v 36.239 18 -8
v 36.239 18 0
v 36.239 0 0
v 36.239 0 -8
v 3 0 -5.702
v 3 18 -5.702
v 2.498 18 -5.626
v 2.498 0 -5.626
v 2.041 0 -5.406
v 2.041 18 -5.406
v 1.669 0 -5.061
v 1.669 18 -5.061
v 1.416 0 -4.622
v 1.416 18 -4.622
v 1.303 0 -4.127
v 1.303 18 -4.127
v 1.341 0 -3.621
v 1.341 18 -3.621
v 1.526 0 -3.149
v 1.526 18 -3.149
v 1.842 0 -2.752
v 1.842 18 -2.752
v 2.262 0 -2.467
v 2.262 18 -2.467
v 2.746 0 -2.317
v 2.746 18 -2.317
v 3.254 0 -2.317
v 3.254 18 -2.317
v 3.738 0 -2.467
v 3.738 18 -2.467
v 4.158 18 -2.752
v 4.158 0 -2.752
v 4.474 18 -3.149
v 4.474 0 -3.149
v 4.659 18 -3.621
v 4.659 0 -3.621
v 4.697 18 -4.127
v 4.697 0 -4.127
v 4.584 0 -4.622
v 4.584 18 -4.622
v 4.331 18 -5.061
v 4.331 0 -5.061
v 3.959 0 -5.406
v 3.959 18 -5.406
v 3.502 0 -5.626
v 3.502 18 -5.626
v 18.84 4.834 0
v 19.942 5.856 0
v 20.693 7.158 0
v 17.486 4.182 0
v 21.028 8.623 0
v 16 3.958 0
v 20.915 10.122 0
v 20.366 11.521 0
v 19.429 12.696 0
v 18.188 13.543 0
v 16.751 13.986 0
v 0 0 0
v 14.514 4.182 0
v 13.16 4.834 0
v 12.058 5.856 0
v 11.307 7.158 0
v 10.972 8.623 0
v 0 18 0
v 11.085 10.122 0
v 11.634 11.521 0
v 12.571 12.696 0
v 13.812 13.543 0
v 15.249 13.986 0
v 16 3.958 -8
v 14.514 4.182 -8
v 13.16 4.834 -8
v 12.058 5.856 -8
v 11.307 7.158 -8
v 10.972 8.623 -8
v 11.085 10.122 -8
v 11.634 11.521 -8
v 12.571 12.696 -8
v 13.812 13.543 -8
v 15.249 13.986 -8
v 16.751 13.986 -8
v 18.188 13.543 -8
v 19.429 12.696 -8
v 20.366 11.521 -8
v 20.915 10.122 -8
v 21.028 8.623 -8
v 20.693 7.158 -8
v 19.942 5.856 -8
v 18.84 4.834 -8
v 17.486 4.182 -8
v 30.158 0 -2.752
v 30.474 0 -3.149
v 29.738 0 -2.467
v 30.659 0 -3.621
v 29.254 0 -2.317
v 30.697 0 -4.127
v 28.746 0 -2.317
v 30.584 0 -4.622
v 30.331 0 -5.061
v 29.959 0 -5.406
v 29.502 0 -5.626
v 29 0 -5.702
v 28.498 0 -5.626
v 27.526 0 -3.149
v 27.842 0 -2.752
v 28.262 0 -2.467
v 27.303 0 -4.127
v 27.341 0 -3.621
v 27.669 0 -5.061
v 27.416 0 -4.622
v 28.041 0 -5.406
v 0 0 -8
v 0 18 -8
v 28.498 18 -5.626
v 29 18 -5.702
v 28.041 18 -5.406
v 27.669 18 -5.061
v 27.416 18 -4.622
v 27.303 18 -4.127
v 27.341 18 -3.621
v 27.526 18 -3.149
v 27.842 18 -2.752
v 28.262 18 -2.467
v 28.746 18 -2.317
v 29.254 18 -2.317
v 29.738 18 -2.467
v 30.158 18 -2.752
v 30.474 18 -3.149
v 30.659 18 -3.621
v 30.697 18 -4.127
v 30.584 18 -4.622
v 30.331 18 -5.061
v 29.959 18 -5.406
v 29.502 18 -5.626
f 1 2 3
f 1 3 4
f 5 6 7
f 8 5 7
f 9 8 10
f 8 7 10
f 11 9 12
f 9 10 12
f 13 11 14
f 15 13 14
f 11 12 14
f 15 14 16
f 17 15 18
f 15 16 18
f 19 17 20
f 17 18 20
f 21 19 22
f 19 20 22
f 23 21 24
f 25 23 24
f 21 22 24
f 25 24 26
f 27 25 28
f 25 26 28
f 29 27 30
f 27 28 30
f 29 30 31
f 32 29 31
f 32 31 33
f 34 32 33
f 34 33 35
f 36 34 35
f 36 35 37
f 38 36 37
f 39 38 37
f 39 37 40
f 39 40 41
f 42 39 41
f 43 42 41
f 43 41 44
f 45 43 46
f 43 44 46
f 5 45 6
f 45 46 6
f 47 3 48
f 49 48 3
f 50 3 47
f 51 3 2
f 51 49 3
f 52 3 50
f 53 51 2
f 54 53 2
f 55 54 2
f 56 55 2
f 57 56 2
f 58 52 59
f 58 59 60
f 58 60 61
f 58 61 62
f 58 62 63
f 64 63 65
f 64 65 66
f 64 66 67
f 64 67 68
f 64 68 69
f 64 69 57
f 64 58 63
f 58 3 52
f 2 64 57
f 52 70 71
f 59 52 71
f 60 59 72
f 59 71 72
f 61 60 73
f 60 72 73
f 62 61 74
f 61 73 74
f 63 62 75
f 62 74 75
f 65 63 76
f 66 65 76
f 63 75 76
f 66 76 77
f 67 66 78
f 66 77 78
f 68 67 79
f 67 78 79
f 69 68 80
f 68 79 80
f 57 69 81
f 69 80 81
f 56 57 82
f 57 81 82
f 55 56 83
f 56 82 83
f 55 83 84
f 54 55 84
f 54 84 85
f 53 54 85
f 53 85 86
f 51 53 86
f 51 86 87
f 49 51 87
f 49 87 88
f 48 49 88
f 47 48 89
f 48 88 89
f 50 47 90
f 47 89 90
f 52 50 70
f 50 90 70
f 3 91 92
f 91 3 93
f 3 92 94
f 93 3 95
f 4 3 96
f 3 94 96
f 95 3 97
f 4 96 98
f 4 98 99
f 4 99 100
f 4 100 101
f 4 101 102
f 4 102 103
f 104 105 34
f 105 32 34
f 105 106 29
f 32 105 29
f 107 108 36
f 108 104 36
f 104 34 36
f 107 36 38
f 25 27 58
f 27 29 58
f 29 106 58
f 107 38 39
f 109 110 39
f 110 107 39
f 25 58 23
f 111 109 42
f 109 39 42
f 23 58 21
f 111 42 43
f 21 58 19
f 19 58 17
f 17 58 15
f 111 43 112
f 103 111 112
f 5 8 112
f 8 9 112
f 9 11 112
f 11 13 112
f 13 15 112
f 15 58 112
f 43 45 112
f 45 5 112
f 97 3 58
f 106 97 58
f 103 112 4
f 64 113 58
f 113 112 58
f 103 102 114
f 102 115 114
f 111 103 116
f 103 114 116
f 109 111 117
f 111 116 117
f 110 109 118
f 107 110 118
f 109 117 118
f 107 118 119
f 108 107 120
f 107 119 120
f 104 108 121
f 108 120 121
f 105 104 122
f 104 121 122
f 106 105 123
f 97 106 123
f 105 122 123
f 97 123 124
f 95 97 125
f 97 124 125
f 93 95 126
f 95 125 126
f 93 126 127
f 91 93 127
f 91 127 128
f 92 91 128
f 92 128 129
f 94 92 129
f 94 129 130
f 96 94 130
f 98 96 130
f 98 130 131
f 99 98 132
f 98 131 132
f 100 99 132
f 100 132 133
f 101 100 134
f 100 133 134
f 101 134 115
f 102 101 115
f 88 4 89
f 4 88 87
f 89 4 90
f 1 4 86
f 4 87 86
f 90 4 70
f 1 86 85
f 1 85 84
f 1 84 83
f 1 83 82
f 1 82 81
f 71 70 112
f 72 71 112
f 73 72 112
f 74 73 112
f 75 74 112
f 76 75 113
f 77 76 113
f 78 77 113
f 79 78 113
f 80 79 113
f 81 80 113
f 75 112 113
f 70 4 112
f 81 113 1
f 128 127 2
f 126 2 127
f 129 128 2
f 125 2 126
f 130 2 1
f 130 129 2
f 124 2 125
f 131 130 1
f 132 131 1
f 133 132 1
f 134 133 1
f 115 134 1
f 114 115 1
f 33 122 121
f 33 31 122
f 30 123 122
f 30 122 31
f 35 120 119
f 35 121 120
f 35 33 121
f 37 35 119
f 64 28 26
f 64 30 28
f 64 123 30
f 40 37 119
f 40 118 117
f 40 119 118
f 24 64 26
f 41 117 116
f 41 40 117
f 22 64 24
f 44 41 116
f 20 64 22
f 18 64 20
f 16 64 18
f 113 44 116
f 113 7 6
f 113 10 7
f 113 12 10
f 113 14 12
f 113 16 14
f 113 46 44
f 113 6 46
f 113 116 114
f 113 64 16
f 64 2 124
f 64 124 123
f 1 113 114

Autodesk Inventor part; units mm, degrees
ref_plane "YZ Plane" through (0, 0, 0) normal (1, 0, 0) x (0, 1, 0)
ref_plane "XZ Plane" through (0, 0, 0) normal (0, 1, 0) x (-1, 0, 0)
ref_plane "XY Plane" through (0, 0, 0) normal (0, 0, 1) x (1, 0, 0)
sketch "Sketch1" plane through (0, 0, 0) normal (0, 1, 0) x (-1, 0, 0)
  line L0 (0, 0) -> (-32, 0)
  line L1 (-32, 0) -> (-32, -8)
  line L2 (-32, -8) -> (0, -8)
  line L3 (0, -8) -> (0, 0)
  line L4 (0, -4) -> (-32, -4) construction
  circle A0 centre (-3, -4) radius 1.5
  circle A1 centre (-29, -4) radius 1.5
  dimension "d1" = 8
  dimension "d2" = 26
  dimension "d20" = 3
  dimension "d21" = 3
  dimension "d22" = 3
extrude "Extrusion1" add sketch "Sketch1" along normal blind 18 contours L3 L2 L1 L0 | A0 | A1
hole "Hole1" at (29, 0, -4) at (3, 0, -4) direction (0, 1, 0) diameter 3.4036 end through all clearance for "Flat Head Machine Screw" size "M3" standard "Ansi Metric M Profile"
sketch "Sketch2" plane through (0, 0, 0) normal (0, 0, 1) x (1, 0, 0)
  line L0 (0, 0) -> (32, 0) projected
  line L1 (32, 0) -> (32, 18) projected
  line L2 (0, 18) -> (32, 18) projected
  line L3 (0, 0) -> (0, 18) projected
  line L4 (0, 9) -> (32, 9)
  line L5 (32, 0) -> (32, 18) projected
  line L6 (16, 18) -> (16, 0)
  circle A0 centre (16, 9) radius 4.7625
  dimension "d28" = 9.525
hole "Hole2" at (16, 9, 0) direction (0, 0, -1) diameter 10.0838 end through all clearance for "Flat Head Machine Screw (82)" size "3/8" standard "Ansi Unified Screw Threads"
sketch "Sketch3" plane through (32, 0, 0) normal (1, 0, 0) x (0, 0, -1)
  line L0 (0, 0) -> (8, 0) projected
  line L1 (8, 0) -> (8, 18) projected
  line L2 (0, 18) -> (8, 18) projected
  line L3 (0, 0) -> (0, 18) projected
  point P0 (0, 0)
extrude "Extrusion2" add sketch "Sketch3" along normal blind 4.239
equation "\"d22\" = d20"
properties part number "Drive Frame Tension Bearing Plate" material "Aluminum 6061"
